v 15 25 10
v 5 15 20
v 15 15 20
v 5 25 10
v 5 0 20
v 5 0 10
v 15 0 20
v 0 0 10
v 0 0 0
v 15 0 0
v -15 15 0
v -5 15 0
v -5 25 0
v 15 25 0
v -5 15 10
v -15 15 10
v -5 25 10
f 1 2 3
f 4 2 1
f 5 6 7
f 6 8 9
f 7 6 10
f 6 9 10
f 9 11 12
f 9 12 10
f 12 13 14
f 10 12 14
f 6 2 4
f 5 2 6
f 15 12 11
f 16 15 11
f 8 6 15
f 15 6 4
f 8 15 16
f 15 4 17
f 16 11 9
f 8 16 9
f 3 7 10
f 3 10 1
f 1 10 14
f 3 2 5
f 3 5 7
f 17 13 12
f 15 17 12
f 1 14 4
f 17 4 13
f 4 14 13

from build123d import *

# Parameters (mm, degrees)
BOSS_EXTRUDE1_DEPTH = 20
CUT_EXTRUDE1_DEPTH  = 10
CUT_EXTRUDE2_DEPTH  = 10


with BuildPart() as part:
    # Sketch1 → Boss-Extrude1 (new body)
    with BuildSketch(Plane.XY):
        Polygon((0, 0), (15, 0), (15, 25), (-5, 25), (-5, 15), (-15, 15), align=None)
    extrude(amount=BOSS_EXTRUDE1_DEPTH)

    # Sketch2 → Cut-Extrude1 (cut)
    with BuildSketch(Plane.XY.offset(20)):
        Polygon((5, 25), (5, 0), (0, 0), (-15, 15), (-5, 15), (-5, 25), align=None)
    extrude(amount=-CUT_EXTRUDE1_DEPTH, mode=Mode.SUBTRACT)

    # Sketch3 → Cut-Extrude2 (cut)
    with BuildSketch(Plane.ZY.offset(-5)):
        Polygon((10, 25), (20, 25), (20, 15), align=None)
    extrude(amount=-CUT_EXTRUDE2_DEPTH, mode=Mode.SUBTRACT)


solid = part.part
